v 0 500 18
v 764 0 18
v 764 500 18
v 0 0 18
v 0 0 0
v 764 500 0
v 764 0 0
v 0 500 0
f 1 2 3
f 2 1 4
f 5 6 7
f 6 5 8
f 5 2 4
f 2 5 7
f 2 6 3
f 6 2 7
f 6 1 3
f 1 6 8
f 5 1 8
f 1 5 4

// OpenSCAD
// file: ../config/TF3D-SDC-01_dimensions.scad
// Modelo fijo TF3D-SDC-01 — unidades en mm
CABINET_W = 800;
CABINET_H = 1000;
CABINET_D = 500;
BOARD_T = 18;
INNER_W = CABINET_W - 2*BOARD_T;
INNER_H = CABINET_H - 2*BOARD_T;
BACK_W = INNER_W;
BACK_H = INNER_H;
BACK_T = BOARD_T;
SHELF_W = INNER_W;
SHELF_D = 450;
SHELF_T = BOARD_T;
TECH_H = 160;
SHELF_Z_1 = 250;
SHELF_Z_2 = 480;
SHELF_Z_3 = 710;
MELAMINE = [0.94,0.94,0.94];
ACRYLIC = [0.65,0.85,1.00,0.30];
METAL = [0.10,0.10,0.10];
// file: ../config/common.scad
include <TF3D-SDC-01_dimensions.scad>
module board(size=[100,100,18], board_color=MELAMINE){ color(board_color) cube(size); }
// main file
include <../config/common.scad>
board([INNER_W,CABINET_D,BOARD_T]);
